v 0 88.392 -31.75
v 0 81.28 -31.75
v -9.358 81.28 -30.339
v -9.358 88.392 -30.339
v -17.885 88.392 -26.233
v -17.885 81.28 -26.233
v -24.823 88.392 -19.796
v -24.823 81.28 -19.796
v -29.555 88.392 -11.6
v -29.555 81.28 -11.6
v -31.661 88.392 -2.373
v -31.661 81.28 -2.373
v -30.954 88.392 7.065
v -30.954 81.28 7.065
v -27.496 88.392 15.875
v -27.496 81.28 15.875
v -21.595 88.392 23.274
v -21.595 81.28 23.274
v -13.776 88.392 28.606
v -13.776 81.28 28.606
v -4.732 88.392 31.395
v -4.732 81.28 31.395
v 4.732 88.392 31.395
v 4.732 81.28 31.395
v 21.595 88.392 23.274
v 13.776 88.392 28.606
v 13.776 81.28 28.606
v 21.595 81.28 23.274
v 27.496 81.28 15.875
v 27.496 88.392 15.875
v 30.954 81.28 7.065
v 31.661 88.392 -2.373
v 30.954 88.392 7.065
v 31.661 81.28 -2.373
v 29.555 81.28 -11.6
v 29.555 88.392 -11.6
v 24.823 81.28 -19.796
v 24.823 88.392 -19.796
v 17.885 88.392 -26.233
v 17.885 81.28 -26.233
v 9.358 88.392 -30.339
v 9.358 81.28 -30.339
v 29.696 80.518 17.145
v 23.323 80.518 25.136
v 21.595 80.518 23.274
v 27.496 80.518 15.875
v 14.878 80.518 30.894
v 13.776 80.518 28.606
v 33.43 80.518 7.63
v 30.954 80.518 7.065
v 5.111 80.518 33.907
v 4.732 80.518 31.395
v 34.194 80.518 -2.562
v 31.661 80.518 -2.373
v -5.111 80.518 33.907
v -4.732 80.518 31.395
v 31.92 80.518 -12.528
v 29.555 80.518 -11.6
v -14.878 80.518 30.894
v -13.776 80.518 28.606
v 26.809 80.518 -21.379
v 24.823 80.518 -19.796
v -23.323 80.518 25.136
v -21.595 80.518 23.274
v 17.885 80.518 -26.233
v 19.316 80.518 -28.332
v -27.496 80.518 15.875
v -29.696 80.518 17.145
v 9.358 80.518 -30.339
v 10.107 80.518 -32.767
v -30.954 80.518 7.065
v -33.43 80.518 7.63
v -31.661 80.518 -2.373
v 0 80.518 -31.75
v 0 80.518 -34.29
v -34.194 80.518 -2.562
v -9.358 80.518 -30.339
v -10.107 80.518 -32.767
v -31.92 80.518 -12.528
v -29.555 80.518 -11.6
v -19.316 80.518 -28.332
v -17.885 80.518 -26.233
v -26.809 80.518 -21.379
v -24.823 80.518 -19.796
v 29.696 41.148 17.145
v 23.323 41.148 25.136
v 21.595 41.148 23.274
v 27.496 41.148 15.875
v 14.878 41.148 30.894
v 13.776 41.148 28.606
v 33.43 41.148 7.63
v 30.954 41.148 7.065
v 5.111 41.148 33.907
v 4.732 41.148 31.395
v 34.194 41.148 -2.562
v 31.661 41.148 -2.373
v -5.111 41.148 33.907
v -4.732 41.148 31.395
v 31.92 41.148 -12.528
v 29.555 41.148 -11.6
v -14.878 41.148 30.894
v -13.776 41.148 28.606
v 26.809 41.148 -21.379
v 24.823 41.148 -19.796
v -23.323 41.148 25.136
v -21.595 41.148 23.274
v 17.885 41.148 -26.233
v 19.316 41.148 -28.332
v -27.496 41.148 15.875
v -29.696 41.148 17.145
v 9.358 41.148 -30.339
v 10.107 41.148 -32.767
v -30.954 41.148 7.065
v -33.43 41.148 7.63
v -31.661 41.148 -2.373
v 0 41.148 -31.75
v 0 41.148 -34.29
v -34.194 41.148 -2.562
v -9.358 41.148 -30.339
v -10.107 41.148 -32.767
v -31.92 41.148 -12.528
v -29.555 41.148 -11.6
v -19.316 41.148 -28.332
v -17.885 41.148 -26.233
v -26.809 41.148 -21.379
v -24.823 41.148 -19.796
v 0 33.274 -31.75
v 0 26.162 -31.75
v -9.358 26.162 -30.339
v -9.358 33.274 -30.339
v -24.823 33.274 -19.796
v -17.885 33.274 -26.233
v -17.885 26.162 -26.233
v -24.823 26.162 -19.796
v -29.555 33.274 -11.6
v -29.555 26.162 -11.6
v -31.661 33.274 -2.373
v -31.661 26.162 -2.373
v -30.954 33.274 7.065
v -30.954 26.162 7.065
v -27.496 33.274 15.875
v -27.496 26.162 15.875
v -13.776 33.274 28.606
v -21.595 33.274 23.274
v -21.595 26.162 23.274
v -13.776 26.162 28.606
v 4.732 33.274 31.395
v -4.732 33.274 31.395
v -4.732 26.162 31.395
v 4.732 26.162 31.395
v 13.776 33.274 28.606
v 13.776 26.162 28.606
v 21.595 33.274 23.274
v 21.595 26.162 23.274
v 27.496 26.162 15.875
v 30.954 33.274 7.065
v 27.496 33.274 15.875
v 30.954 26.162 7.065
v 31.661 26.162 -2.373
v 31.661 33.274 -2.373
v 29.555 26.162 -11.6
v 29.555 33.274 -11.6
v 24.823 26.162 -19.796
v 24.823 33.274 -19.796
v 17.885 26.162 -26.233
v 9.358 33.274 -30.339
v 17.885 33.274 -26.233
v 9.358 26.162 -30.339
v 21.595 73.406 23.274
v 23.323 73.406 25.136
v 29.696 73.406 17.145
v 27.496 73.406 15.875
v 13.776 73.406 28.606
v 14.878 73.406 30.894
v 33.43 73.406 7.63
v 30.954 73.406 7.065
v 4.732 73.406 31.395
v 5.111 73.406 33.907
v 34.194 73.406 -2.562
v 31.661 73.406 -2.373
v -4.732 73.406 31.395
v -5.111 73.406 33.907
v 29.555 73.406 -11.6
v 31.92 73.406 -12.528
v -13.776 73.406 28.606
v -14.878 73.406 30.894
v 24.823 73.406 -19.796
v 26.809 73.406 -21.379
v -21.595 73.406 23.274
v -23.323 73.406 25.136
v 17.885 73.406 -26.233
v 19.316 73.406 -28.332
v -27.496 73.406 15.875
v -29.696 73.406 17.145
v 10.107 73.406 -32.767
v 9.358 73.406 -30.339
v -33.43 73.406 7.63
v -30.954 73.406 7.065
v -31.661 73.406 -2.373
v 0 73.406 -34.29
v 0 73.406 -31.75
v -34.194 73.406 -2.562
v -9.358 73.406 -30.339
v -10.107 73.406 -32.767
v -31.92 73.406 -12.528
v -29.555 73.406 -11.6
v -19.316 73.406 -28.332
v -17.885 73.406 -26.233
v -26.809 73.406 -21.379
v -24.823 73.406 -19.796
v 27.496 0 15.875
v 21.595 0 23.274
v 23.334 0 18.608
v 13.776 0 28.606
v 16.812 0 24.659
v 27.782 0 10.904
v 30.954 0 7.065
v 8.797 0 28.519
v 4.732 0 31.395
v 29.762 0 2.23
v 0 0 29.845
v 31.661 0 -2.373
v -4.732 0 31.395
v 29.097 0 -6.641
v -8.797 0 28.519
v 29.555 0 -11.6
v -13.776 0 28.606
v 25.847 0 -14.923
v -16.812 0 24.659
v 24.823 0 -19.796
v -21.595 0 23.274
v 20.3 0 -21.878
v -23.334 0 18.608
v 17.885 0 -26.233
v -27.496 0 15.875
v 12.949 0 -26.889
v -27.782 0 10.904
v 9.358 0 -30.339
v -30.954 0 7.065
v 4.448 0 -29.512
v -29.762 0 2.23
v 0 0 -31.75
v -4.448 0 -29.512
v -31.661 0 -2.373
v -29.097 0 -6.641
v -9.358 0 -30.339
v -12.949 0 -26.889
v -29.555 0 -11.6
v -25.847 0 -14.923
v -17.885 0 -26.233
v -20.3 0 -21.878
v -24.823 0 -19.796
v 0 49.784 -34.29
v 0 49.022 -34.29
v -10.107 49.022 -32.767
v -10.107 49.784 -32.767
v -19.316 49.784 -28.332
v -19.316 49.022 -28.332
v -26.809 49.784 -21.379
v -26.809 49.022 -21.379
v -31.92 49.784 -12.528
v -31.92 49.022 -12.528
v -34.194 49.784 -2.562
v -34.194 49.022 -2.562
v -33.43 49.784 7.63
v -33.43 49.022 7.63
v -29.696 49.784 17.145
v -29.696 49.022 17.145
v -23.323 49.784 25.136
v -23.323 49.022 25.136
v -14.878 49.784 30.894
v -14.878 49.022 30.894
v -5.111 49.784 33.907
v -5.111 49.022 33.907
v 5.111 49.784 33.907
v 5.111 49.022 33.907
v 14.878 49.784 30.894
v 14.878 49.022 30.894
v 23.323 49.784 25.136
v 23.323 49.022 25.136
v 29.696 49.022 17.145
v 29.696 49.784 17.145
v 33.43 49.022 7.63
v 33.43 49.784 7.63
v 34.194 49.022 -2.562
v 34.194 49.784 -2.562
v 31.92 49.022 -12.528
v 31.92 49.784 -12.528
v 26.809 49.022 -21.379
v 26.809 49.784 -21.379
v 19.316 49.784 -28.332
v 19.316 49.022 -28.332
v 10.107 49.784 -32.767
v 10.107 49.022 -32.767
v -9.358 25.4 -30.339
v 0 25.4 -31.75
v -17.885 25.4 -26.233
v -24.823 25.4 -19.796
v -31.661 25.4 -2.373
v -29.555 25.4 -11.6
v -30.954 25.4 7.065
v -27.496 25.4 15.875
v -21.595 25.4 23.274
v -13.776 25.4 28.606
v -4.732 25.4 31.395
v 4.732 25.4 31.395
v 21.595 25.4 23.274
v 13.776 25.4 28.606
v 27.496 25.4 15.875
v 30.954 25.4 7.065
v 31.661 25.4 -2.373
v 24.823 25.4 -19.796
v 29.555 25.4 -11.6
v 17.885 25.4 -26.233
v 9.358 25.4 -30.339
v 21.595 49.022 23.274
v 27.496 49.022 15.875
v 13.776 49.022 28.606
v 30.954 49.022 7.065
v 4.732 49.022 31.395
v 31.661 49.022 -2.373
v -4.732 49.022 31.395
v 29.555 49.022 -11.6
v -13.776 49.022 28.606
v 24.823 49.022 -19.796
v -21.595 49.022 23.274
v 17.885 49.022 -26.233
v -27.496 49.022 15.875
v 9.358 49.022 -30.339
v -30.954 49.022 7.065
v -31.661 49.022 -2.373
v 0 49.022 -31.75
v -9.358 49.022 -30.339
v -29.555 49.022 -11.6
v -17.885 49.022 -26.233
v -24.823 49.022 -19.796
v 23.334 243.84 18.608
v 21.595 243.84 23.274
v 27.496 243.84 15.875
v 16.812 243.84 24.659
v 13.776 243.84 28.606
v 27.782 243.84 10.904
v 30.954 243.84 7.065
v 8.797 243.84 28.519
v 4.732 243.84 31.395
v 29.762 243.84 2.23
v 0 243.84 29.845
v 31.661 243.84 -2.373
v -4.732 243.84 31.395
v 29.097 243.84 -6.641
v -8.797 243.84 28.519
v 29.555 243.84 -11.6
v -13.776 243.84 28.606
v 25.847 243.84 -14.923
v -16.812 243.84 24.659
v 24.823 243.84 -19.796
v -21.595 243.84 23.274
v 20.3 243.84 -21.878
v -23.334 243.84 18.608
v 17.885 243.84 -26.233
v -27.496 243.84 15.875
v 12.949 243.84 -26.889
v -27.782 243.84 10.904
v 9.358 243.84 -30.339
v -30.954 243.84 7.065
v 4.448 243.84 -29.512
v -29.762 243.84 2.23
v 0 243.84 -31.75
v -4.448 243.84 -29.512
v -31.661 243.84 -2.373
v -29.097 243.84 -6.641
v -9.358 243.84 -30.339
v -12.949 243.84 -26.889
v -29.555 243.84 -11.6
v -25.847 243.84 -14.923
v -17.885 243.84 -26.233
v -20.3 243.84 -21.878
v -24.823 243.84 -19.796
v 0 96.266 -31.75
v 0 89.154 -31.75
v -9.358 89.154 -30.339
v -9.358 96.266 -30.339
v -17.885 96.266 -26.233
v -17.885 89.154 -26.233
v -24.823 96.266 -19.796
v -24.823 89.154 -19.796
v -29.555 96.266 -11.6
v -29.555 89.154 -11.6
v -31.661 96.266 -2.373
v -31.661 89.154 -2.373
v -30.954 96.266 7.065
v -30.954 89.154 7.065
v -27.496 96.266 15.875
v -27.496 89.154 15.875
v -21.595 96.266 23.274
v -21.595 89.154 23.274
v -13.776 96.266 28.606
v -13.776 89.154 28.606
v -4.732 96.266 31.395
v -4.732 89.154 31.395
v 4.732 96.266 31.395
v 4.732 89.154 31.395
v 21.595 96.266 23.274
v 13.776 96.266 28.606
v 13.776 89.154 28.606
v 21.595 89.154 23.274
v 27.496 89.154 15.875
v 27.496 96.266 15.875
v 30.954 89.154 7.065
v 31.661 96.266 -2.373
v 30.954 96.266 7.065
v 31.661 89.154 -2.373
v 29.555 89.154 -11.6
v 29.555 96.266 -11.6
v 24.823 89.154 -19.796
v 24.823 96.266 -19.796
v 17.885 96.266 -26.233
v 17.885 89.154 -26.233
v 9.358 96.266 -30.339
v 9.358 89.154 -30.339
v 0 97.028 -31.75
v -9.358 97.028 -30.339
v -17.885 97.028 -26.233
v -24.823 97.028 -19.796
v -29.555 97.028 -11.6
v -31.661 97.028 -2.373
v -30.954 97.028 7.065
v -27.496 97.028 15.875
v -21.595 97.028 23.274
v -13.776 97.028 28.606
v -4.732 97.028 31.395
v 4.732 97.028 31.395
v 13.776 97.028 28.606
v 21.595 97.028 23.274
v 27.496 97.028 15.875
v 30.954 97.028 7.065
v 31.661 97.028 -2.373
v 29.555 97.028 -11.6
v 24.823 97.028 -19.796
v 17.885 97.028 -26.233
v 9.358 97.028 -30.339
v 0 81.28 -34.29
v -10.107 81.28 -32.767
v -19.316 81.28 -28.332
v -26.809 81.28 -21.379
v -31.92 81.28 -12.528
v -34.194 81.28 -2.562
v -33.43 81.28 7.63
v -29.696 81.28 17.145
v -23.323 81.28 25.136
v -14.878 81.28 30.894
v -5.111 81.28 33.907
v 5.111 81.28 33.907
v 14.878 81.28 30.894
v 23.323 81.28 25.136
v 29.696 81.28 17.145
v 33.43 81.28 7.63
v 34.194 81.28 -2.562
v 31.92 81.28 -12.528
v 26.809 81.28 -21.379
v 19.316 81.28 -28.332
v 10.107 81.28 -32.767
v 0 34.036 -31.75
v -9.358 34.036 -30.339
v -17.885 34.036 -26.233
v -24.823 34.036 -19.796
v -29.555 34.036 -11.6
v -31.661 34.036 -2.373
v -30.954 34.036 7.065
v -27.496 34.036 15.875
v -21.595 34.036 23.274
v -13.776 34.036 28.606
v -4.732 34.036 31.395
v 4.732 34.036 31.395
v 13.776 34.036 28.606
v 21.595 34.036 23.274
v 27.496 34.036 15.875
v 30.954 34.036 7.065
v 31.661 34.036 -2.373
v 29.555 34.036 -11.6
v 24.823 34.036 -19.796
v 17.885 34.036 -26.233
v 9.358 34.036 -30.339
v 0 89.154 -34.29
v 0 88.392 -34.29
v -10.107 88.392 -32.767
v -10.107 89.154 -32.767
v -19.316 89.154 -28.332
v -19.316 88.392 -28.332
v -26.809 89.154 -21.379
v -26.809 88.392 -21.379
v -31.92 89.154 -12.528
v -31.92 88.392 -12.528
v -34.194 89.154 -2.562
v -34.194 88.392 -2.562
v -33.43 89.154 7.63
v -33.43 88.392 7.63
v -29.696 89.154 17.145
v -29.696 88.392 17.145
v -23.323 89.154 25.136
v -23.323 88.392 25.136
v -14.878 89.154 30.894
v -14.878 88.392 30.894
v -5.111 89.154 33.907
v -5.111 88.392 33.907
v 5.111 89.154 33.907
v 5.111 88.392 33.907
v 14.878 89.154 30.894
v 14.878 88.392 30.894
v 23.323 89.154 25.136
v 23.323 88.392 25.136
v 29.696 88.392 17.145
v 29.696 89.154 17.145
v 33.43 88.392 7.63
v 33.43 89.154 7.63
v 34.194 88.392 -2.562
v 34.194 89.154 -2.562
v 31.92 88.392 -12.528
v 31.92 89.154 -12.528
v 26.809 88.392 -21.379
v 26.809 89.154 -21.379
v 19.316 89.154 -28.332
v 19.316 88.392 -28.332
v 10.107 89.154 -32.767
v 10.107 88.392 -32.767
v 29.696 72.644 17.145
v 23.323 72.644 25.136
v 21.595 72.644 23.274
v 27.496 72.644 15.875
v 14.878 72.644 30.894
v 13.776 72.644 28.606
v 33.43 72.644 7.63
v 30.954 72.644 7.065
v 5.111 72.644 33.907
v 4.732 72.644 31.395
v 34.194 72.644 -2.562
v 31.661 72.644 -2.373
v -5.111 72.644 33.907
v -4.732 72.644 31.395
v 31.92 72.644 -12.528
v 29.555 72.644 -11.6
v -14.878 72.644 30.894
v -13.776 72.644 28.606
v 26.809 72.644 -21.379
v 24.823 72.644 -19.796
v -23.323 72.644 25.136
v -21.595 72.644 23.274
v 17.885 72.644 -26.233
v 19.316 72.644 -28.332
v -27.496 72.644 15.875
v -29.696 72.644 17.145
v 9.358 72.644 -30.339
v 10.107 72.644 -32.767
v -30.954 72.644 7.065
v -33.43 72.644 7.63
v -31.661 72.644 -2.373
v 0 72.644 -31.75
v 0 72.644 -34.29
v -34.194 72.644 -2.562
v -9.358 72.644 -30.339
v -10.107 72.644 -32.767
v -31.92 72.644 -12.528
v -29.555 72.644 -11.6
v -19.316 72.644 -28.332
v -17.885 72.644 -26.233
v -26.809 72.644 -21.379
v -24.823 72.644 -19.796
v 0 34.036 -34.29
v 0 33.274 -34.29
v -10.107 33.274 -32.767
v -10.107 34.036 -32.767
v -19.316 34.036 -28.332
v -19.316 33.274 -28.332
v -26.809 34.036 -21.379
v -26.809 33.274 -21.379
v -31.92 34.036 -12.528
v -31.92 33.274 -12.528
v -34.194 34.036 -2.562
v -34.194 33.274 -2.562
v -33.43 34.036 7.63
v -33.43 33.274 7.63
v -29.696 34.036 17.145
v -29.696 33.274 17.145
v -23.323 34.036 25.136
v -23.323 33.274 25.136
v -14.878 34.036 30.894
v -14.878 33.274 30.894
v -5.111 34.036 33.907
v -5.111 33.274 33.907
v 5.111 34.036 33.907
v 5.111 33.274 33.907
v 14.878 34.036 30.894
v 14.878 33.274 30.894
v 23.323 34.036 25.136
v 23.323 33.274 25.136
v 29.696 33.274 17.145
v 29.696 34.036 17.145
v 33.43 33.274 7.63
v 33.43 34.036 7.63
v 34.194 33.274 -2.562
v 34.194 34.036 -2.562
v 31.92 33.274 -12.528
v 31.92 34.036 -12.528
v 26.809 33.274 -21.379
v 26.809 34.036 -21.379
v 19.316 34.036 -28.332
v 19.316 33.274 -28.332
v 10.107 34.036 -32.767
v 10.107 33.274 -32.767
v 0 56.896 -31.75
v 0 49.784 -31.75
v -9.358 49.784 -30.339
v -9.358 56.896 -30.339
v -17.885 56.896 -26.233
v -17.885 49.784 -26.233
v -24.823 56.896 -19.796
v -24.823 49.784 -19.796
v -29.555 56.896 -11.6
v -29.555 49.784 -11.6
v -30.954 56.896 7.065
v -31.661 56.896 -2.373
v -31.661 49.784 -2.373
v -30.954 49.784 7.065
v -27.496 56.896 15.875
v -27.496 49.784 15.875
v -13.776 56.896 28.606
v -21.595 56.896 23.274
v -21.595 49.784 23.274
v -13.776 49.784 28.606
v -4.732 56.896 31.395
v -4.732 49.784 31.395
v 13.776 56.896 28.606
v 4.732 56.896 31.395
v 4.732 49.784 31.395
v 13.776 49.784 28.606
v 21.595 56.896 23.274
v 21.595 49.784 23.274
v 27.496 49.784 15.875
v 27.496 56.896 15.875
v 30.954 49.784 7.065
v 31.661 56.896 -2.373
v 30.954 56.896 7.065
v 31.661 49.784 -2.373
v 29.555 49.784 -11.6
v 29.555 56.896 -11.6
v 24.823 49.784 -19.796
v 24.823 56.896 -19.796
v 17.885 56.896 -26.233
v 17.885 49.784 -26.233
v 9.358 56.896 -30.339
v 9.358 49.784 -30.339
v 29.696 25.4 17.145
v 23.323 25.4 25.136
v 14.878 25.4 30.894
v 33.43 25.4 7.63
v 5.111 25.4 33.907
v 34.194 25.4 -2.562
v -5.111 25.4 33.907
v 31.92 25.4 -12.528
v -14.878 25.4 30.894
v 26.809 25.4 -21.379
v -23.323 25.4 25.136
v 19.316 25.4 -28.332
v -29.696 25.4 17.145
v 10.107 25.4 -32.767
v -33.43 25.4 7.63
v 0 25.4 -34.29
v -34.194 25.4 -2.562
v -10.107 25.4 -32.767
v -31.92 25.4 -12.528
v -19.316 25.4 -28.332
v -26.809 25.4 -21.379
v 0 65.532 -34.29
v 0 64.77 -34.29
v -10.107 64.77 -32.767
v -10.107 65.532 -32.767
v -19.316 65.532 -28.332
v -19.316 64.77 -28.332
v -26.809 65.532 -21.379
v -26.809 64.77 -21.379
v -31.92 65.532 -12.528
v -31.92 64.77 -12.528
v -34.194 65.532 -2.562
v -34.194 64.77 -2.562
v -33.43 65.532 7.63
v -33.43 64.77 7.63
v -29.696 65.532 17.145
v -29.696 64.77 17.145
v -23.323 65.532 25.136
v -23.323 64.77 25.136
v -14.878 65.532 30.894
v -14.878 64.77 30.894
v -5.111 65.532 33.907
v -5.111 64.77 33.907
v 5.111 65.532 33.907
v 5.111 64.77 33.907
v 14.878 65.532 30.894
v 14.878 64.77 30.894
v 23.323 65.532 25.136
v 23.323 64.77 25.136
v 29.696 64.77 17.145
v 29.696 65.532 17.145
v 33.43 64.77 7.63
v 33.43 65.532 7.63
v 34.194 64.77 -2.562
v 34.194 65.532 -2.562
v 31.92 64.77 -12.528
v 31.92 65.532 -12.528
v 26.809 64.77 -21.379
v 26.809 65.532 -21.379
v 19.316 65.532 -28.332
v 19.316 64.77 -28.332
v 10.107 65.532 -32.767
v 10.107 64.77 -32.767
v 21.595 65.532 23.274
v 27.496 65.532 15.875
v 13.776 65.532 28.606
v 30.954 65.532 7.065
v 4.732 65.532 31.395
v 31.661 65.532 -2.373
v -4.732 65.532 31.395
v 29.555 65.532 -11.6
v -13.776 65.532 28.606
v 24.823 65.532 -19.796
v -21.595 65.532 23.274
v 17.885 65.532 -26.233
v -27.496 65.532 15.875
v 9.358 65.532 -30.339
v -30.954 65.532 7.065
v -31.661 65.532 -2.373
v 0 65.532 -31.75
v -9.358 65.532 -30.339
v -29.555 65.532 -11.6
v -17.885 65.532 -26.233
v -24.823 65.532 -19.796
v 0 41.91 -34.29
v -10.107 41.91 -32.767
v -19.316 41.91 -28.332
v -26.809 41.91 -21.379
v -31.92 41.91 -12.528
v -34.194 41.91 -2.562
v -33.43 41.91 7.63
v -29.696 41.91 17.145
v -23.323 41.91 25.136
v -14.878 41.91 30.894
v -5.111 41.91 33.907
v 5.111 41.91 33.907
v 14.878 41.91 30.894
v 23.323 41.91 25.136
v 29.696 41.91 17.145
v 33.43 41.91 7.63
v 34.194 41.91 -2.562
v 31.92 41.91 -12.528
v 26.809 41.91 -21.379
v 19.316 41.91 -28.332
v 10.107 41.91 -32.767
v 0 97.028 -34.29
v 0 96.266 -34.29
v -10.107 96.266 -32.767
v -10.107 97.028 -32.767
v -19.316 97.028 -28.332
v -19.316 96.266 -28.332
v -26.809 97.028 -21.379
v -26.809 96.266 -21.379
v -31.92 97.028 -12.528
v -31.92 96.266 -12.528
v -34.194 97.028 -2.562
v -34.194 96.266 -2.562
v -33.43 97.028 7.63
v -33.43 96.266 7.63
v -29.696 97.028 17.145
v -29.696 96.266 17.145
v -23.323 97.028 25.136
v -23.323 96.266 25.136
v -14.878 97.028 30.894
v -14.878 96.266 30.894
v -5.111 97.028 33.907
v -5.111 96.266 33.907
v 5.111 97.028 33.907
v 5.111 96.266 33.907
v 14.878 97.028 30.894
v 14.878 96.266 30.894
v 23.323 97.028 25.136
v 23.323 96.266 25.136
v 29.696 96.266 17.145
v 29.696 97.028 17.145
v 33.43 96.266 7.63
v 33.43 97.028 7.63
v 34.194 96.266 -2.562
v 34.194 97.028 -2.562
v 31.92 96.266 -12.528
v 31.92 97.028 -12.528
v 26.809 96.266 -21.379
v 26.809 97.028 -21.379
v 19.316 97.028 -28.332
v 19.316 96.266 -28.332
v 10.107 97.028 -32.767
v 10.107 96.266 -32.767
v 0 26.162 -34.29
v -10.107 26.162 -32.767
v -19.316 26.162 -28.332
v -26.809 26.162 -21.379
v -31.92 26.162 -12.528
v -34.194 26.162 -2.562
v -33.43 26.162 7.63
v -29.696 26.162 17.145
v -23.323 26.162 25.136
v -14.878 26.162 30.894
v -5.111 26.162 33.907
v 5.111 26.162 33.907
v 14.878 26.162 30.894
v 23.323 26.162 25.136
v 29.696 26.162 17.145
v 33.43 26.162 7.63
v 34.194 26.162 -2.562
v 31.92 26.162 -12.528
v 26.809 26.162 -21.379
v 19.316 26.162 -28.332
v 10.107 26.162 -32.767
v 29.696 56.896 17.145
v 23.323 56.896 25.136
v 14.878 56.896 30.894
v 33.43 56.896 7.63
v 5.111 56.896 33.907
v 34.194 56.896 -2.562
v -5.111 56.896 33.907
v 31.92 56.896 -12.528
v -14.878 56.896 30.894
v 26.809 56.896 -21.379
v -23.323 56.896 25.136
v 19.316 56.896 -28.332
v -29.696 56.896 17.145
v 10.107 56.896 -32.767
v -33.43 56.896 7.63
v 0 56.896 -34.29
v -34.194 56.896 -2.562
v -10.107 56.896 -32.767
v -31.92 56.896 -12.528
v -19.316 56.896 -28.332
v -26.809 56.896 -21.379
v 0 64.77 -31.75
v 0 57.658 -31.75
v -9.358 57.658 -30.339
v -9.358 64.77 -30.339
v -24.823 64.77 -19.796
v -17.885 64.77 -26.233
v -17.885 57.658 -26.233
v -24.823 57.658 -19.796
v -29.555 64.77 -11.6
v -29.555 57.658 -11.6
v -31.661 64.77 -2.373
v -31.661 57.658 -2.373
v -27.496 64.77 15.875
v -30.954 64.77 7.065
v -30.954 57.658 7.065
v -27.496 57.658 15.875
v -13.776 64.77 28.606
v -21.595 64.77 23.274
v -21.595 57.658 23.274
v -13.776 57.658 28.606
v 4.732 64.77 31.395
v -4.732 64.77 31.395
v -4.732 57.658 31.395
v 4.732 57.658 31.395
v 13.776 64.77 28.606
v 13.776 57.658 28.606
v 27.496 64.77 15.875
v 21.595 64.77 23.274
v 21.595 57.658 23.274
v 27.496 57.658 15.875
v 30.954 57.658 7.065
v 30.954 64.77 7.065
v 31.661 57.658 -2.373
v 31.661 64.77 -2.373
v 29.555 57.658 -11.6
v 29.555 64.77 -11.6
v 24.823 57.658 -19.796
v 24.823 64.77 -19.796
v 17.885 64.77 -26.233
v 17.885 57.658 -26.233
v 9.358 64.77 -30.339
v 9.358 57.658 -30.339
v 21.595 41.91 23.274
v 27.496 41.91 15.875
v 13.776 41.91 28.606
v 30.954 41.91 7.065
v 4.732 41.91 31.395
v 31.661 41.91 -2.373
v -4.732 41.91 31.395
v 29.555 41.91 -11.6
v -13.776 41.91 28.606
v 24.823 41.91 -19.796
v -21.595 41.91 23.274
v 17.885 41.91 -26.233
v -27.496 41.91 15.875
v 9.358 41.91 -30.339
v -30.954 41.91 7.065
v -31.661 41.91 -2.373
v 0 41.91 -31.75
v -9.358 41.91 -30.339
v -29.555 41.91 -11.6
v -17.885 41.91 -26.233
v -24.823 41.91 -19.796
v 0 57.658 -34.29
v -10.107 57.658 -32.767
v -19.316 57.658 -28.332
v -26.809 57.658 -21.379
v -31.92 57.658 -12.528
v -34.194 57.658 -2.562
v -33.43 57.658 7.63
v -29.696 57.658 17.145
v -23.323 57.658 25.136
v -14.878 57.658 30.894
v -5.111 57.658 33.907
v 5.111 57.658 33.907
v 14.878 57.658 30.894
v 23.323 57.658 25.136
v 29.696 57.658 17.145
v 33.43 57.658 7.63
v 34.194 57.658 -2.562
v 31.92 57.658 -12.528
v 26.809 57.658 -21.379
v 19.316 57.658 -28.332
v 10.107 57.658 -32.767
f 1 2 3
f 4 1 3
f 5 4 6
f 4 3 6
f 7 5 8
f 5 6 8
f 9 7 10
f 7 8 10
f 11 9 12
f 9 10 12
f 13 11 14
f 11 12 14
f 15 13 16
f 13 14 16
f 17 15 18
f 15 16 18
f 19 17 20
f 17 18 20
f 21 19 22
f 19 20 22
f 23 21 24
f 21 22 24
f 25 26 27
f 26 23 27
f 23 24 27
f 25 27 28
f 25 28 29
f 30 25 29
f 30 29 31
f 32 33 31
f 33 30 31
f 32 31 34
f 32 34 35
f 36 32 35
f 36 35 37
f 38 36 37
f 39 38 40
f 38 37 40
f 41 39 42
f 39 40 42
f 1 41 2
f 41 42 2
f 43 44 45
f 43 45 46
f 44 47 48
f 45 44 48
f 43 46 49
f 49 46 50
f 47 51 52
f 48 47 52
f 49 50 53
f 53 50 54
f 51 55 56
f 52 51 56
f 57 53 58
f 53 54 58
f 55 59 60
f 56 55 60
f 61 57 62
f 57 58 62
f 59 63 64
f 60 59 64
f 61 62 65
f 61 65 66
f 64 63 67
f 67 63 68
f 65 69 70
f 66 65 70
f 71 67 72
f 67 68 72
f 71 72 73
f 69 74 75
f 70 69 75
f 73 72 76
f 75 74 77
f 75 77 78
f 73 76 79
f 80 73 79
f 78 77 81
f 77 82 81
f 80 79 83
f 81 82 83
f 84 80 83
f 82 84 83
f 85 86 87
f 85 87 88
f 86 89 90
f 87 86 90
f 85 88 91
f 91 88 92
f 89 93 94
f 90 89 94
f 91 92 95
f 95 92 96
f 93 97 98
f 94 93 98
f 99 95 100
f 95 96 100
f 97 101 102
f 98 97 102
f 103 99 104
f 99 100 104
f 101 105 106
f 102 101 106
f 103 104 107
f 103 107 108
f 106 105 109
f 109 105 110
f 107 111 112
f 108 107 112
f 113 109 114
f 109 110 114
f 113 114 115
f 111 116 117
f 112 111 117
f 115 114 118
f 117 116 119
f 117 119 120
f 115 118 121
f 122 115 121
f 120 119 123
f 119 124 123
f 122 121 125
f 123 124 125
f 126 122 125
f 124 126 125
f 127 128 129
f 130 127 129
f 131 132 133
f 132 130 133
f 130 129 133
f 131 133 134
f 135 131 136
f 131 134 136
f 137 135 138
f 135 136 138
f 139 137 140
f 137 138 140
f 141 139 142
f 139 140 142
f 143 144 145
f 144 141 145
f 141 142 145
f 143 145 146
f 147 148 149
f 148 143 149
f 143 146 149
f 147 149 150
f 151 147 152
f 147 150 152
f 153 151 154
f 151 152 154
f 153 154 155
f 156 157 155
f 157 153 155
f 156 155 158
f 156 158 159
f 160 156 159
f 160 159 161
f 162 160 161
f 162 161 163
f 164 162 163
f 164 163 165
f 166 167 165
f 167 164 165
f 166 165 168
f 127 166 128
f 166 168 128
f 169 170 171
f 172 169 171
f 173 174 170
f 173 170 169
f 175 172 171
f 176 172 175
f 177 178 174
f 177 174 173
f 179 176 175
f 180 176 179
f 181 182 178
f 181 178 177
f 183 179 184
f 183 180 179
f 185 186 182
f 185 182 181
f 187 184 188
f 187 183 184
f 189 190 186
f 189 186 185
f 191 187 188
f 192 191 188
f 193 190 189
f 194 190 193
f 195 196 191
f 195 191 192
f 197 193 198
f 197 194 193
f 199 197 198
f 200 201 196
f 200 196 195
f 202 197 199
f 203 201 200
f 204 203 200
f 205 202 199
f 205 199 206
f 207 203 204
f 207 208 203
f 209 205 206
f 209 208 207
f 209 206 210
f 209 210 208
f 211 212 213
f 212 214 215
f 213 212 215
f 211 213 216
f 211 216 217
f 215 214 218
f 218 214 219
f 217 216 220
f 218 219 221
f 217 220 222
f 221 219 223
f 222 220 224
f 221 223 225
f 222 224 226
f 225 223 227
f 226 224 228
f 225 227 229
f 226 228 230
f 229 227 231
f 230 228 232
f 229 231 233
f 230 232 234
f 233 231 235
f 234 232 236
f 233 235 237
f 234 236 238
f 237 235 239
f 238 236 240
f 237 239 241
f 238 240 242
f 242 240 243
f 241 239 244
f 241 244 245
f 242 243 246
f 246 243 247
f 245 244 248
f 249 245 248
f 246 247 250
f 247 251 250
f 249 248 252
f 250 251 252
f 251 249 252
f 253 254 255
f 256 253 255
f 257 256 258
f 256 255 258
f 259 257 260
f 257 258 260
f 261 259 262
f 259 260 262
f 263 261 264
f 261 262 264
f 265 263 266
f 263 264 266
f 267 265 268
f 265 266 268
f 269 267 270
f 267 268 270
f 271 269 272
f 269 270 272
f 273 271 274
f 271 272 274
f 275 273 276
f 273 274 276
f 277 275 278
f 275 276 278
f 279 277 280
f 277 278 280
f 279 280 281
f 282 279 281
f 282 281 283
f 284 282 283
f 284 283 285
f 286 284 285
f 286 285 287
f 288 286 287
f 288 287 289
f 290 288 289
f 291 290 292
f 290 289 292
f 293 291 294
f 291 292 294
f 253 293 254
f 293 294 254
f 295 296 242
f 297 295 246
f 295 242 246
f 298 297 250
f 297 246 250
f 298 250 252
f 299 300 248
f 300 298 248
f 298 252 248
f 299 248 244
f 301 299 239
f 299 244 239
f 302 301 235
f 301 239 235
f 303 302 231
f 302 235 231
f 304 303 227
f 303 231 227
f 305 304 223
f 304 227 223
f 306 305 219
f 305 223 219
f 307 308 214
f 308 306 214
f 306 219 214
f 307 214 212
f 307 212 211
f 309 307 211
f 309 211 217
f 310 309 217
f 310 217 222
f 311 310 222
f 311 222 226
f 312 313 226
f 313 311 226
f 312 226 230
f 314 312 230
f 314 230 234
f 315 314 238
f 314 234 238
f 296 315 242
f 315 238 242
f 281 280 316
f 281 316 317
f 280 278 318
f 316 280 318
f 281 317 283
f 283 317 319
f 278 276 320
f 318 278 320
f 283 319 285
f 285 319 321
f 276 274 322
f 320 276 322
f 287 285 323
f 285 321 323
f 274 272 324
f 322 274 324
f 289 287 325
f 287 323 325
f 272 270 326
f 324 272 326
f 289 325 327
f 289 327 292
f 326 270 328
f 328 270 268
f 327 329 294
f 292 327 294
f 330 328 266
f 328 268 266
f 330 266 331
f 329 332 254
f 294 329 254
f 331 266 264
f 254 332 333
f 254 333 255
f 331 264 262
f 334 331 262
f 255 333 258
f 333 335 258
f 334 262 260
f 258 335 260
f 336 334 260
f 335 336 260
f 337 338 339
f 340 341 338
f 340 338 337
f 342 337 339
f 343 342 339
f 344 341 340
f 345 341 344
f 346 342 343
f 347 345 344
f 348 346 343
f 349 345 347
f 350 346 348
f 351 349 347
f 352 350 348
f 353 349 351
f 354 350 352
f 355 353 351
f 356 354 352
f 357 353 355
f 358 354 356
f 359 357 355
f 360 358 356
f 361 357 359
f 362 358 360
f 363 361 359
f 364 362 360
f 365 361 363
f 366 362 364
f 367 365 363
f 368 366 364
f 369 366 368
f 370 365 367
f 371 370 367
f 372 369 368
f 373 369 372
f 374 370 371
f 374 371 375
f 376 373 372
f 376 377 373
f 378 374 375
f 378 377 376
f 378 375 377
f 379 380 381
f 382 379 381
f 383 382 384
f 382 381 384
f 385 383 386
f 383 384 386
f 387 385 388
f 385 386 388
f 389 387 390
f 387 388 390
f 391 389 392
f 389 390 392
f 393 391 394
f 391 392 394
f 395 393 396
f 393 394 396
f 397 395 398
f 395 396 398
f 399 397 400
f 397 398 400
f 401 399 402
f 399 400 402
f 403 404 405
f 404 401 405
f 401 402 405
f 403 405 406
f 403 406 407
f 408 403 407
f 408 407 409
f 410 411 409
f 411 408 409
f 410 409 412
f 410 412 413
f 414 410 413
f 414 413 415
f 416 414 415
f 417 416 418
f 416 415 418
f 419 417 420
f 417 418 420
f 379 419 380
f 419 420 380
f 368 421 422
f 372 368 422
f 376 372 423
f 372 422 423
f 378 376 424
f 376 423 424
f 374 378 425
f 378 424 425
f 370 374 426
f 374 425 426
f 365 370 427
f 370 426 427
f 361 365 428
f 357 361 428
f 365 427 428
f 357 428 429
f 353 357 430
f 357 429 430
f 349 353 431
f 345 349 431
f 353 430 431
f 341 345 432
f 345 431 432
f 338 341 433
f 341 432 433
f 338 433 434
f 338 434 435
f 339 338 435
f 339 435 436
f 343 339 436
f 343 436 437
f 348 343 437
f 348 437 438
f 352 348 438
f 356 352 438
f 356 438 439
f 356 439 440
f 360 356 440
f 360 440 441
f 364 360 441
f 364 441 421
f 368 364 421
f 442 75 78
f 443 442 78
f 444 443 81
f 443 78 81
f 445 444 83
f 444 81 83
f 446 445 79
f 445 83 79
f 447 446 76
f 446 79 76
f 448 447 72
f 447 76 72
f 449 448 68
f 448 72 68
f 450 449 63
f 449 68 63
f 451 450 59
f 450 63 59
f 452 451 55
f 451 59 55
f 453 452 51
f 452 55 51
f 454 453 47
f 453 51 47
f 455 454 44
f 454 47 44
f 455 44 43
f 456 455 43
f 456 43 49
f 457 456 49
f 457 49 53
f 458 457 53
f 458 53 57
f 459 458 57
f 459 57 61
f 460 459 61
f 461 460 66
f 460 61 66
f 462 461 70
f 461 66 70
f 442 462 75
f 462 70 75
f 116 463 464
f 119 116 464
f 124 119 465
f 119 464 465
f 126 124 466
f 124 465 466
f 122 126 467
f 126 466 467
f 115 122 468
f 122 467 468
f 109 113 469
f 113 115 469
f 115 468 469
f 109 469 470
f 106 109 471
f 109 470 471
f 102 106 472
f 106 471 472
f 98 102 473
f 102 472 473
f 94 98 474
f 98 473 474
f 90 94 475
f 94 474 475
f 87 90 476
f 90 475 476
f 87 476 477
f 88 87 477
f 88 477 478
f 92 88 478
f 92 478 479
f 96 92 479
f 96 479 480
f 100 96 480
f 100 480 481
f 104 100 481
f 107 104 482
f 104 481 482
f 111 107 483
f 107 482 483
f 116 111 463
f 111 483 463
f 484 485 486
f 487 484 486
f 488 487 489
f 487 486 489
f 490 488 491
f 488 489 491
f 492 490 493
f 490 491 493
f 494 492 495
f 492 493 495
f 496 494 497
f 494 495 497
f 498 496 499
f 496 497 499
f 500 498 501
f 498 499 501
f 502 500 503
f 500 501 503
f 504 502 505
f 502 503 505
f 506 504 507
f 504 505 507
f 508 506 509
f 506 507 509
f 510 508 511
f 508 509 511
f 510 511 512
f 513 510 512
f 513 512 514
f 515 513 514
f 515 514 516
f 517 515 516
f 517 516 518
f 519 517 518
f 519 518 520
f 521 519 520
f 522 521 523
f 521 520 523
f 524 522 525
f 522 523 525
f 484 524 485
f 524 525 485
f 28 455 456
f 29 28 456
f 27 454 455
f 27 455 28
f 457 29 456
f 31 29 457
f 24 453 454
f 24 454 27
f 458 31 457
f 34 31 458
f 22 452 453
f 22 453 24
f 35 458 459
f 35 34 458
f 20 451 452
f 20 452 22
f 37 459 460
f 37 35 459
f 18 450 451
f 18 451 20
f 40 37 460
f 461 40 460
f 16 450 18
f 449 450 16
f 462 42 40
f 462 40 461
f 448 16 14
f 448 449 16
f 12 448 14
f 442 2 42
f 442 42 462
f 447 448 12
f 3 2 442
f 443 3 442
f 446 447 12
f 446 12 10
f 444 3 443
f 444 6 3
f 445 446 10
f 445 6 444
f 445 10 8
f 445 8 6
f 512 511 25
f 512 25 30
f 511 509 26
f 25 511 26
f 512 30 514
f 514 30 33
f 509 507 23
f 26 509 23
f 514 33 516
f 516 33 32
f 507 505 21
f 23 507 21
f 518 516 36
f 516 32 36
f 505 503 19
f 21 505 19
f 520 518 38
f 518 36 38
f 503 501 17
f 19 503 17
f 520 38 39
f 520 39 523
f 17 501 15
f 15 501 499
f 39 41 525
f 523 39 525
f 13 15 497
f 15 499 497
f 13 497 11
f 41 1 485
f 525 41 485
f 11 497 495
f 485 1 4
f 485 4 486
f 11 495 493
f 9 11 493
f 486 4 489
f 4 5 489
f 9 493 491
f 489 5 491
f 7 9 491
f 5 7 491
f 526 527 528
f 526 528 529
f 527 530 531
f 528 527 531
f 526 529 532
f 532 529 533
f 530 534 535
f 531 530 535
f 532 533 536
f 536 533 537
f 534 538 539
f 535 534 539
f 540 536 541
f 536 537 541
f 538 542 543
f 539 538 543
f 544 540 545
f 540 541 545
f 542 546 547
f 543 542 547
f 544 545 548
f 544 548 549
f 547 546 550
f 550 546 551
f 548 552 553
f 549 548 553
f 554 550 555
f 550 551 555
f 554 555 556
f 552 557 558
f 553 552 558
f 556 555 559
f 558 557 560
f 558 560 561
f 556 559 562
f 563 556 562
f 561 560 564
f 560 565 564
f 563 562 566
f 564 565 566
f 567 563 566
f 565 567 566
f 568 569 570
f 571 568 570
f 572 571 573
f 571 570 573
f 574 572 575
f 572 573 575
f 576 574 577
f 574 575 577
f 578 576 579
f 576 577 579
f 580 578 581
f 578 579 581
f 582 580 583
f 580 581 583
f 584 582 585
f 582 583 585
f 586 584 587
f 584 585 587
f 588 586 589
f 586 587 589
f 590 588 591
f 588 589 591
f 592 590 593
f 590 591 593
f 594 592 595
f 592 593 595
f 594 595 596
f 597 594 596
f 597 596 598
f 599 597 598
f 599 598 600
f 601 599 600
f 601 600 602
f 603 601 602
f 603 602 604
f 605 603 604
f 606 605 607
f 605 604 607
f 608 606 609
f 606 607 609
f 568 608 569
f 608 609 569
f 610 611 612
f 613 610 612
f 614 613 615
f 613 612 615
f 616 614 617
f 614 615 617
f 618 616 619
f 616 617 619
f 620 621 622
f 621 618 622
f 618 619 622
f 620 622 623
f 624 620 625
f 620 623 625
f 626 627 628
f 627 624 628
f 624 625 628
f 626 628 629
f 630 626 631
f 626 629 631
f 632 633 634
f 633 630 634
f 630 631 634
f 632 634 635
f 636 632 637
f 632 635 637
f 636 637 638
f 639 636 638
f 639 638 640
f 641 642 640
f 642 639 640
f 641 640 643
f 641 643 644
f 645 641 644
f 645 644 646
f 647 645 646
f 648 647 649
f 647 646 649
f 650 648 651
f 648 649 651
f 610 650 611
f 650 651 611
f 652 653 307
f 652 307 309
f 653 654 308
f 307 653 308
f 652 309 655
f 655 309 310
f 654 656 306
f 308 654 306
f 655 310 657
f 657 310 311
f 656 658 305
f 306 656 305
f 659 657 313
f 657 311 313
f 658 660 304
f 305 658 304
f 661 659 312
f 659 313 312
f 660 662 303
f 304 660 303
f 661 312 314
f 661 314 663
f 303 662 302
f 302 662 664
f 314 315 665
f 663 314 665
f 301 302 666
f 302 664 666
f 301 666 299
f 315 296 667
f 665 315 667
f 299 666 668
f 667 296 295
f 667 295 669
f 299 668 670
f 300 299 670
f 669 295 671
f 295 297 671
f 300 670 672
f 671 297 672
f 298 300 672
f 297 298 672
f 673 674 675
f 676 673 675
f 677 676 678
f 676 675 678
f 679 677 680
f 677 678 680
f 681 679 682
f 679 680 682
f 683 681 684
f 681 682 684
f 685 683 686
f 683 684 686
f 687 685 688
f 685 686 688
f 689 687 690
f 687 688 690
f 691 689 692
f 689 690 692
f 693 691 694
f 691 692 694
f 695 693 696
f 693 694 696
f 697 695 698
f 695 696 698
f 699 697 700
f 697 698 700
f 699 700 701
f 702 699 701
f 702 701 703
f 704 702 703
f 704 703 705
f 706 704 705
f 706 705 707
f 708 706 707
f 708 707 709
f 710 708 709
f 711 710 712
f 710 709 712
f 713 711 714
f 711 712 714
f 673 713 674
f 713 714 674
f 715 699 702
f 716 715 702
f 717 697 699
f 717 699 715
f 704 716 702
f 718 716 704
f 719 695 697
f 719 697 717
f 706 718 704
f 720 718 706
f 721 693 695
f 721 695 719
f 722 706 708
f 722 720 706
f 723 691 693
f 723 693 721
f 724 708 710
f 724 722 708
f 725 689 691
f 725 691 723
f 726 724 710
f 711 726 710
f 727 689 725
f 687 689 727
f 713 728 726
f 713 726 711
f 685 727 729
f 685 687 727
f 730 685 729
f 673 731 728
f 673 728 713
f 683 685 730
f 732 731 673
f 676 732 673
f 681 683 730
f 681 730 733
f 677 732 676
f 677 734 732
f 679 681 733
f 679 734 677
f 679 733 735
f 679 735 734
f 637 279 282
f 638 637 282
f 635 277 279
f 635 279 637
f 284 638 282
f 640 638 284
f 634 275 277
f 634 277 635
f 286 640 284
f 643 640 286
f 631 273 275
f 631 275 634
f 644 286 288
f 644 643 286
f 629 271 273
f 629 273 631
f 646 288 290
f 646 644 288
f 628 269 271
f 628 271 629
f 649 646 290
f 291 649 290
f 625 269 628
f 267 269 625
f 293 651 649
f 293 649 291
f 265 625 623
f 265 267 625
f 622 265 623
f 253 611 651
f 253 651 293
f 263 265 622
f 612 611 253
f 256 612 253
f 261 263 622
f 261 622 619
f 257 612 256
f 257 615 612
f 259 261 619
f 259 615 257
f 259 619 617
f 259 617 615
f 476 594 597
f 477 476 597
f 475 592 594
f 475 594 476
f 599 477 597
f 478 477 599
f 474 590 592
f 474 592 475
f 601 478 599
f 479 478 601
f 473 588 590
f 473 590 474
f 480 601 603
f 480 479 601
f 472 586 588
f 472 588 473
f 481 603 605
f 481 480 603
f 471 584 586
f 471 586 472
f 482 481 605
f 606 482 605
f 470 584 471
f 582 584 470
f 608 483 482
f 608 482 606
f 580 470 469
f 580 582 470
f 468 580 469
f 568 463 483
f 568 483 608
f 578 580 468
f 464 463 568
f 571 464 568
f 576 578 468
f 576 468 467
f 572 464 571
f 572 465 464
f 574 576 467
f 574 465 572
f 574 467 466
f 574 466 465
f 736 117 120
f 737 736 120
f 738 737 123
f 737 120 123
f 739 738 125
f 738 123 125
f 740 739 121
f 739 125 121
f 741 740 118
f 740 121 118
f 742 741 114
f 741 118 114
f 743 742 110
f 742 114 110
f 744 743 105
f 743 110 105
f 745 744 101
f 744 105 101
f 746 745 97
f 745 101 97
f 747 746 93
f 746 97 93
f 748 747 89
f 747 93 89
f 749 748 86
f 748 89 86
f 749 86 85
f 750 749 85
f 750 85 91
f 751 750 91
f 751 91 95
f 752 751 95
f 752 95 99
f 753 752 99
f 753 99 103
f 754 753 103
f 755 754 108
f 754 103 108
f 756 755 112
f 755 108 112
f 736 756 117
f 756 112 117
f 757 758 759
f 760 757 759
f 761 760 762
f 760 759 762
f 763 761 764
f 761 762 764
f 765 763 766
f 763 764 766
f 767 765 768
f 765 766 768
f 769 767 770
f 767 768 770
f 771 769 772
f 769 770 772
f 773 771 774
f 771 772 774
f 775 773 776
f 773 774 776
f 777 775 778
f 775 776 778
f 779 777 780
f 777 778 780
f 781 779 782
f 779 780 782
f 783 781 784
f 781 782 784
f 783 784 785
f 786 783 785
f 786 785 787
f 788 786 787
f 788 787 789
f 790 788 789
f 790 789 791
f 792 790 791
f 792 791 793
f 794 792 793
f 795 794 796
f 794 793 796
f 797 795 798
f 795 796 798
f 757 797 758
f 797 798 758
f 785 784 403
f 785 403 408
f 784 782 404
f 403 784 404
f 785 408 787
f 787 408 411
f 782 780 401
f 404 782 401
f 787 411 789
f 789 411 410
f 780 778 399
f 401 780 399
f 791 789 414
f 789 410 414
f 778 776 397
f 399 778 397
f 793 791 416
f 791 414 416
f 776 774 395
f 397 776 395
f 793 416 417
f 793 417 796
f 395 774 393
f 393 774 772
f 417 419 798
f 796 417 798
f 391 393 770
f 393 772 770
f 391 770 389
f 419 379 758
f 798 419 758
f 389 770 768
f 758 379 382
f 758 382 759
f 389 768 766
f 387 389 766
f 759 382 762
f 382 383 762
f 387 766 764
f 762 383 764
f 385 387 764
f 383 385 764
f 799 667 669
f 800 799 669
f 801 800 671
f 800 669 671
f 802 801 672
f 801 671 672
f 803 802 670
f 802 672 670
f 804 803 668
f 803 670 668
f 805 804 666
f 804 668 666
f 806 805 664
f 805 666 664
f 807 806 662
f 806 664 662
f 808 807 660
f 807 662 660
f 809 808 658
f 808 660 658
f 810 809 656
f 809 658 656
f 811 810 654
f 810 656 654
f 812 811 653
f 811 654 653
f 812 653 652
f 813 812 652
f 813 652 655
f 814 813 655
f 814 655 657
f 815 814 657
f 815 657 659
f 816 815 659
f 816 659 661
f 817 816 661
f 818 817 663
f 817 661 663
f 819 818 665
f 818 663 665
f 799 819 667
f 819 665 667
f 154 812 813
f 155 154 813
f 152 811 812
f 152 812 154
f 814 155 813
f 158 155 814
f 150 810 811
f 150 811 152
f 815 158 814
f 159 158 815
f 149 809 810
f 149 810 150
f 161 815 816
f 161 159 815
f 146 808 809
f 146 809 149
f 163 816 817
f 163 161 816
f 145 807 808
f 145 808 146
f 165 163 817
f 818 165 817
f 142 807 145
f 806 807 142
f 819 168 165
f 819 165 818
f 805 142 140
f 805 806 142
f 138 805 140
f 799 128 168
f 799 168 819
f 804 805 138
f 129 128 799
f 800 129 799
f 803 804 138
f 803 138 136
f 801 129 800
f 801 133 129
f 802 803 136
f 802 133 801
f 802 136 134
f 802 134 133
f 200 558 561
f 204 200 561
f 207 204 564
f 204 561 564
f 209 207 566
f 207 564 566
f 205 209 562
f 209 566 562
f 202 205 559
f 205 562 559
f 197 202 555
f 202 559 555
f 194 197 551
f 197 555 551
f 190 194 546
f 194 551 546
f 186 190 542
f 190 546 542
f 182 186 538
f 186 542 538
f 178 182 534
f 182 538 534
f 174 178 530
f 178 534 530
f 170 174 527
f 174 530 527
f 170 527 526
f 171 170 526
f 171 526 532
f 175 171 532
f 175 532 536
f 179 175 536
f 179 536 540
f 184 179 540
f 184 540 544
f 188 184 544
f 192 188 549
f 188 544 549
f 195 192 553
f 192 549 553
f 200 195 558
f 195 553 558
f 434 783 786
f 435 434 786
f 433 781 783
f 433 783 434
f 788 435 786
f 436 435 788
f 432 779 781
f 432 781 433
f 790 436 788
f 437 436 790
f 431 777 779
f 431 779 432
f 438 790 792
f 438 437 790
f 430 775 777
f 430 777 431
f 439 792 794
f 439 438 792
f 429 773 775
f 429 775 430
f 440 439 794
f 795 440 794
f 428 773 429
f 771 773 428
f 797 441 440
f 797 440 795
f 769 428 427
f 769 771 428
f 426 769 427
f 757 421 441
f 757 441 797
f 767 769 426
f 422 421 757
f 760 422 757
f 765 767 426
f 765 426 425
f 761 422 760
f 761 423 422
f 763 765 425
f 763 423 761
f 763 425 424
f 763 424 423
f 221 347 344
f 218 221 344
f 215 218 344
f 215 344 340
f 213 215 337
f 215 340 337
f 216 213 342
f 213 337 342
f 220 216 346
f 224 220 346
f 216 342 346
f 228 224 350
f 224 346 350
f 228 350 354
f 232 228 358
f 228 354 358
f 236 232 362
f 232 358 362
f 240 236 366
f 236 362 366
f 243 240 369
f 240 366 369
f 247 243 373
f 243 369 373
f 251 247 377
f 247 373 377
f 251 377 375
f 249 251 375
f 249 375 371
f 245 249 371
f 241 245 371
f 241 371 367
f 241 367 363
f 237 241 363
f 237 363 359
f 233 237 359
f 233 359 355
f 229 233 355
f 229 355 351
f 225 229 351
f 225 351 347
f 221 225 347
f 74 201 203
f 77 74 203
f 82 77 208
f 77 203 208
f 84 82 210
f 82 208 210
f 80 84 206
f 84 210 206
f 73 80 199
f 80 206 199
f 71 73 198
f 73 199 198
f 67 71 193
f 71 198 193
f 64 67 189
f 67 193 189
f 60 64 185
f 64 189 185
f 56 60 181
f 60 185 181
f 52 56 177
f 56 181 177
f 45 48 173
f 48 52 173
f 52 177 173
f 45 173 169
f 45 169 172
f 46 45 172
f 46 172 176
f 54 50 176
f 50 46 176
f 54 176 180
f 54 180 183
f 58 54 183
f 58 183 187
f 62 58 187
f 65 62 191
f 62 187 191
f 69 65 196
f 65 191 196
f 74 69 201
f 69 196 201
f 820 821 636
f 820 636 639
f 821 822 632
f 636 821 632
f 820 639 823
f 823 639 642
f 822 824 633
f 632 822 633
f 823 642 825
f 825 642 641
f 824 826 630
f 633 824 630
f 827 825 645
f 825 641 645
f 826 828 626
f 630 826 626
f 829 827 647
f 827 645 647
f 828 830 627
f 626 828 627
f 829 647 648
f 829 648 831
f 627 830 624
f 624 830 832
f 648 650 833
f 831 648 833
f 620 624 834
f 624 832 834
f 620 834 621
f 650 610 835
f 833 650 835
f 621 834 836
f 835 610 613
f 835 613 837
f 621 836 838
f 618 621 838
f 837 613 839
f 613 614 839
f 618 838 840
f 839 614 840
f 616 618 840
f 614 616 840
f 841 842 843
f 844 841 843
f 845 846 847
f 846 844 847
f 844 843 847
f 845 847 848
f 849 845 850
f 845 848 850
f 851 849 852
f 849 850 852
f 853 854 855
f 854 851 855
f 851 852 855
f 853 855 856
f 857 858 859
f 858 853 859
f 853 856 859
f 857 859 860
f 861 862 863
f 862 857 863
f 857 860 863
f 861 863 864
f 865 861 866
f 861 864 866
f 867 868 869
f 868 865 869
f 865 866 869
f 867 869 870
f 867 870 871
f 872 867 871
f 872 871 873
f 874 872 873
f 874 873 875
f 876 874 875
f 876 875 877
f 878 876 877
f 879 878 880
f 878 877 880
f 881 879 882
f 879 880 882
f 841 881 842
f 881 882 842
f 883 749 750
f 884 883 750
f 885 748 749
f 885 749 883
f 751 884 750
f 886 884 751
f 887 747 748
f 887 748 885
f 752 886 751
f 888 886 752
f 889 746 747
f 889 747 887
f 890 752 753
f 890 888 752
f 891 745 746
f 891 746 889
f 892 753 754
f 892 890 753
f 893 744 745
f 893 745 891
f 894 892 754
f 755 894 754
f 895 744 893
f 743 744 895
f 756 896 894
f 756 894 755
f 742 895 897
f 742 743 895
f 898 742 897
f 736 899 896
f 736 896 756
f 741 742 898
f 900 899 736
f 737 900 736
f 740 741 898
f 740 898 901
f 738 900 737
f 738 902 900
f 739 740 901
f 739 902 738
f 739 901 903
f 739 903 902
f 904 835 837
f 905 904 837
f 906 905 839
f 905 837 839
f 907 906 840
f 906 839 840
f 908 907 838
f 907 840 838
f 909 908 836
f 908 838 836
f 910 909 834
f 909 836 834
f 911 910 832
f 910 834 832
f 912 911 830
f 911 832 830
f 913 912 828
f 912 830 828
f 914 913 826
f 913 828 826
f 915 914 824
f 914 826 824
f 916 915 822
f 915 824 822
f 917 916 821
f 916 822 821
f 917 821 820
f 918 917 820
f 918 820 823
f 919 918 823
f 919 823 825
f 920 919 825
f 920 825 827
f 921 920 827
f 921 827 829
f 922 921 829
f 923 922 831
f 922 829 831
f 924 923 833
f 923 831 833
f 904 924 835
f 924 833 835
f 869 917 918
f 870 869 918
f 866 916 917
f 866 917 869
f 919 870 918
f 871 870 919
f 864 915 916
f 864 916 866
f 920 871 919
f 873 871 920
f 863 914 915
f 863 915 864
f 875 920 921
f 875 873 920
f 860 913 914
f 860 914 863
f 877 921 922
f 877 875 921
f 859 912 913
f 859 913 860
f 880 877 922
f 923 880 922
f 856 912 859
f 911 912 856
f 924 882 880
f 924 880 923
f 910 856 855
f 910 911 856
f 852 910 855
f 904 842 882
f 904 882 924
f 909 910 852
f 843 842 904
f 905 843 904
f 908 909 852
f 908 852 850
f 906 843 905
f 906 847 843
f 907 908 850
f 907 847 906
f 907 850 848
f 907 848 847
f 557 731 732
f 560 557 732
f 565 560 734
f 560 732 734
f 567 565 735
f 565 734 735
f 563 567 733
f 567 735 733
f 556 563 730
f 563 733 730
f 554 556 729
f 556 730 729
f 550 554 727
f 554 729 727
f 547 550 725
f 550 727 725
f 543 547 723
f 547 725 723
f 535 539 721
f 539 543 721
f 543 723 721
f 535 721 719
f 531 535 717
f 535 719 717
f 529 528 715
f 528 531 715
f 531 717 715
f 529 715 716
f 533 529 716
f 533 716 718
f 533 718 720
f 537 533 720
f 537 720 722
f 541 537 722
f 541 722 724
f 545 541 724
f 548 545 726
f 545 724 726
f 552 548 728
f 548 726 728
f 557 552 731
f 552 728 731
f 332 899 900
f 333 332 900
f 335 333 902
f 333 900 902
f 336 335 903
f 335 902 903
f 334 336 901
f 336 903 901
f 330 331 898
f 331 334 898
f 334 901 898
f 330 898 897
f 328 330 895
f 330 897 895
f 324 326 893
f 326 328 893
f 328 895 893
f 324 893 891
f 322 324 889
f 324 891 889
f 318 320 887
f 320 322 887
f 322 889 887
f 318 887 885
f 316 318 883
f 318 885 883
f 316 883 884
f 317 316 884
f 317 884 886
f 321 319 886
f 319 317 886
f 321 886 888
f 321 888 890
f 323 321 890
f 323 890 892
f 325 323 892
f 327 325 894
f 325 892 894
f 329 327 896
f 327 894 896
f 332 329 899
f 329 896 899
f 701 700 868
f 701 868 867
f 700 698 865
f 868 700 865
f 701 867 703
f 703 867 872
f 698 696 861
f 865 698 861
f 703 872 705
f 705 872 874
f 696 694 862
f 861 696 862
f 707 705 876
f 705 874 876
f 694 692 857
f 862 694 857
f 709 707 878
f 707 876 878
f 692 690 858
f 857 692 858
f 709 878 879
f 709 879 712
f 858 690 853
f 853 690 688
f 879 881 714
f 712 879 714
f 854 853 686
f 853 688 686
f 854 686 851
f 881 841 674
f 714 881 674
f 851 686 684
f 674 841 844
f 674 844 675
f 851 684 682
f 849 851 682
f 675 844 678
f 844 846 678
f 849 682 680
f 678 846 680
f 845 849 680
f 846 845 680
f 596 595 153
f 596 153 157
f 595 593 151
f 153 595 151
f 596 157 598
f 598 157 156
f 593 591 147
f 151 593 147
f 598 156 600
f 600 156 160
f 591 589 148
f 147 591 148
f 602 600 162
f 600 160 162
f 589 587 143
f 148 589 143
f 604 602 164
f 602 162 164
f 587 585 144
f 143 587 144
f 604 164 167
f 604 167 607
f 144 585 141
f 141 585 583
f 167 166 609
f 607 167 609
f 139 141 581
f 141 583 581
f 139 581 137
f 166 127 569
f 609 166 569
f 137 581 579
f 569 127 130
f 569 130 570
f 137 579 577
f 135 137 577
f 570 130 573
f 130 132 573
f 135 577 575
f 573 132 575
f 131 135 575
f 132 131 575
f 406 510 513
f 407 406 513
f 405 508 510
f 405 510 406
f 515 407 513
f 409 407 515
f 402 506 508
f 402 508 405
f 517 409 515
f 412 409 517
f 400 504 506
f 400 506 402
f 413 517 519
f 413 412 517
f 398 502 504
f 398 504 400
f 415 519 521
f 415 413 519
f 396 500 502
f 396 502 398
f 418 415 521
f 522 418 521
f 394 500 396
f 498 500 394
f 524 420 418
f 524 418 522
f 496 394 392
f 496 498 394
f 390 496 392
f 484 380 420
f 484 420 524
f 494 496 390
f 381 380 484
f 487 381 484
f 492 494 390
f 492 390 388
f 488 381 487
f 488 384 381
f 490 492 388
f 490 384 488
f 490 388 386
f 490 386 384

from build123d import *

# Parameters (mm, degrees)
SKETCH1_R           = 31.75
BOSS_EXTRUDE1_DEPTH = 243.84
SKETCH2_R           = 34.29
BOSS_EXTRUDE2_DEPTH = 0.762
LPATTERN1_COUNT     = 10
LPATTERN1_PITCH     = 7.874
SKETCH3_R           = 29.845
CUT_EXTRUDE1_DEPTH  = 249.61527266


with BuildPart() as part:
    # Sketch1 → Boss-Extrude1 (new body)
    with BuildSketch(Plane(origin=(0, 0, 0), x_dir=(1, 0, 0), z_dir=(0, 1, 0))):
        with Locations(Location((0, 0, 0), (0, 0, 90))):
            Circle(SKETCH1_R)
    extrude(amount=BOSS_EXTRUDE1_DEPTH)

    # Sketch2 → Boss-Extrude2 (add)
    with BuildSketch(Plane(origin=(0, 25.4, 0), x_dir=(1, 0, 0), z_dir=(0, 1, 0))):
        with Locations(Location((0, 0, 0), (0, 0, 90))):
            Circle(SKETCH2_R)
    boss_extrude2 = extrude(amount=BOSS_EXTRUDE2_DEPTH)

    # LPattern1: Boss-Extrude2 ×10
    with Locations(*[(0, i * LPATTERN1_PITCH, 0) for i in range(1, LPATTERN1_COUNT)]):
        add(boss_extrude2)

    # Sketch3 → Cut-Extrude1 (cut, through all)
    with BuildSketch(Plane(origin=(0, 243.84, 0), x_dir=(1, 0, 0), z_dir=(0, 1, 0))):
        with Locations(Location((0, 0, 0), (0, 0, 270))):
            Circle(SKETCH3_R)
    extrude(amount=-CUT_EXTRUDE1_DEPTH, mode=Mode.SUBTRACT)


solid = part.part
